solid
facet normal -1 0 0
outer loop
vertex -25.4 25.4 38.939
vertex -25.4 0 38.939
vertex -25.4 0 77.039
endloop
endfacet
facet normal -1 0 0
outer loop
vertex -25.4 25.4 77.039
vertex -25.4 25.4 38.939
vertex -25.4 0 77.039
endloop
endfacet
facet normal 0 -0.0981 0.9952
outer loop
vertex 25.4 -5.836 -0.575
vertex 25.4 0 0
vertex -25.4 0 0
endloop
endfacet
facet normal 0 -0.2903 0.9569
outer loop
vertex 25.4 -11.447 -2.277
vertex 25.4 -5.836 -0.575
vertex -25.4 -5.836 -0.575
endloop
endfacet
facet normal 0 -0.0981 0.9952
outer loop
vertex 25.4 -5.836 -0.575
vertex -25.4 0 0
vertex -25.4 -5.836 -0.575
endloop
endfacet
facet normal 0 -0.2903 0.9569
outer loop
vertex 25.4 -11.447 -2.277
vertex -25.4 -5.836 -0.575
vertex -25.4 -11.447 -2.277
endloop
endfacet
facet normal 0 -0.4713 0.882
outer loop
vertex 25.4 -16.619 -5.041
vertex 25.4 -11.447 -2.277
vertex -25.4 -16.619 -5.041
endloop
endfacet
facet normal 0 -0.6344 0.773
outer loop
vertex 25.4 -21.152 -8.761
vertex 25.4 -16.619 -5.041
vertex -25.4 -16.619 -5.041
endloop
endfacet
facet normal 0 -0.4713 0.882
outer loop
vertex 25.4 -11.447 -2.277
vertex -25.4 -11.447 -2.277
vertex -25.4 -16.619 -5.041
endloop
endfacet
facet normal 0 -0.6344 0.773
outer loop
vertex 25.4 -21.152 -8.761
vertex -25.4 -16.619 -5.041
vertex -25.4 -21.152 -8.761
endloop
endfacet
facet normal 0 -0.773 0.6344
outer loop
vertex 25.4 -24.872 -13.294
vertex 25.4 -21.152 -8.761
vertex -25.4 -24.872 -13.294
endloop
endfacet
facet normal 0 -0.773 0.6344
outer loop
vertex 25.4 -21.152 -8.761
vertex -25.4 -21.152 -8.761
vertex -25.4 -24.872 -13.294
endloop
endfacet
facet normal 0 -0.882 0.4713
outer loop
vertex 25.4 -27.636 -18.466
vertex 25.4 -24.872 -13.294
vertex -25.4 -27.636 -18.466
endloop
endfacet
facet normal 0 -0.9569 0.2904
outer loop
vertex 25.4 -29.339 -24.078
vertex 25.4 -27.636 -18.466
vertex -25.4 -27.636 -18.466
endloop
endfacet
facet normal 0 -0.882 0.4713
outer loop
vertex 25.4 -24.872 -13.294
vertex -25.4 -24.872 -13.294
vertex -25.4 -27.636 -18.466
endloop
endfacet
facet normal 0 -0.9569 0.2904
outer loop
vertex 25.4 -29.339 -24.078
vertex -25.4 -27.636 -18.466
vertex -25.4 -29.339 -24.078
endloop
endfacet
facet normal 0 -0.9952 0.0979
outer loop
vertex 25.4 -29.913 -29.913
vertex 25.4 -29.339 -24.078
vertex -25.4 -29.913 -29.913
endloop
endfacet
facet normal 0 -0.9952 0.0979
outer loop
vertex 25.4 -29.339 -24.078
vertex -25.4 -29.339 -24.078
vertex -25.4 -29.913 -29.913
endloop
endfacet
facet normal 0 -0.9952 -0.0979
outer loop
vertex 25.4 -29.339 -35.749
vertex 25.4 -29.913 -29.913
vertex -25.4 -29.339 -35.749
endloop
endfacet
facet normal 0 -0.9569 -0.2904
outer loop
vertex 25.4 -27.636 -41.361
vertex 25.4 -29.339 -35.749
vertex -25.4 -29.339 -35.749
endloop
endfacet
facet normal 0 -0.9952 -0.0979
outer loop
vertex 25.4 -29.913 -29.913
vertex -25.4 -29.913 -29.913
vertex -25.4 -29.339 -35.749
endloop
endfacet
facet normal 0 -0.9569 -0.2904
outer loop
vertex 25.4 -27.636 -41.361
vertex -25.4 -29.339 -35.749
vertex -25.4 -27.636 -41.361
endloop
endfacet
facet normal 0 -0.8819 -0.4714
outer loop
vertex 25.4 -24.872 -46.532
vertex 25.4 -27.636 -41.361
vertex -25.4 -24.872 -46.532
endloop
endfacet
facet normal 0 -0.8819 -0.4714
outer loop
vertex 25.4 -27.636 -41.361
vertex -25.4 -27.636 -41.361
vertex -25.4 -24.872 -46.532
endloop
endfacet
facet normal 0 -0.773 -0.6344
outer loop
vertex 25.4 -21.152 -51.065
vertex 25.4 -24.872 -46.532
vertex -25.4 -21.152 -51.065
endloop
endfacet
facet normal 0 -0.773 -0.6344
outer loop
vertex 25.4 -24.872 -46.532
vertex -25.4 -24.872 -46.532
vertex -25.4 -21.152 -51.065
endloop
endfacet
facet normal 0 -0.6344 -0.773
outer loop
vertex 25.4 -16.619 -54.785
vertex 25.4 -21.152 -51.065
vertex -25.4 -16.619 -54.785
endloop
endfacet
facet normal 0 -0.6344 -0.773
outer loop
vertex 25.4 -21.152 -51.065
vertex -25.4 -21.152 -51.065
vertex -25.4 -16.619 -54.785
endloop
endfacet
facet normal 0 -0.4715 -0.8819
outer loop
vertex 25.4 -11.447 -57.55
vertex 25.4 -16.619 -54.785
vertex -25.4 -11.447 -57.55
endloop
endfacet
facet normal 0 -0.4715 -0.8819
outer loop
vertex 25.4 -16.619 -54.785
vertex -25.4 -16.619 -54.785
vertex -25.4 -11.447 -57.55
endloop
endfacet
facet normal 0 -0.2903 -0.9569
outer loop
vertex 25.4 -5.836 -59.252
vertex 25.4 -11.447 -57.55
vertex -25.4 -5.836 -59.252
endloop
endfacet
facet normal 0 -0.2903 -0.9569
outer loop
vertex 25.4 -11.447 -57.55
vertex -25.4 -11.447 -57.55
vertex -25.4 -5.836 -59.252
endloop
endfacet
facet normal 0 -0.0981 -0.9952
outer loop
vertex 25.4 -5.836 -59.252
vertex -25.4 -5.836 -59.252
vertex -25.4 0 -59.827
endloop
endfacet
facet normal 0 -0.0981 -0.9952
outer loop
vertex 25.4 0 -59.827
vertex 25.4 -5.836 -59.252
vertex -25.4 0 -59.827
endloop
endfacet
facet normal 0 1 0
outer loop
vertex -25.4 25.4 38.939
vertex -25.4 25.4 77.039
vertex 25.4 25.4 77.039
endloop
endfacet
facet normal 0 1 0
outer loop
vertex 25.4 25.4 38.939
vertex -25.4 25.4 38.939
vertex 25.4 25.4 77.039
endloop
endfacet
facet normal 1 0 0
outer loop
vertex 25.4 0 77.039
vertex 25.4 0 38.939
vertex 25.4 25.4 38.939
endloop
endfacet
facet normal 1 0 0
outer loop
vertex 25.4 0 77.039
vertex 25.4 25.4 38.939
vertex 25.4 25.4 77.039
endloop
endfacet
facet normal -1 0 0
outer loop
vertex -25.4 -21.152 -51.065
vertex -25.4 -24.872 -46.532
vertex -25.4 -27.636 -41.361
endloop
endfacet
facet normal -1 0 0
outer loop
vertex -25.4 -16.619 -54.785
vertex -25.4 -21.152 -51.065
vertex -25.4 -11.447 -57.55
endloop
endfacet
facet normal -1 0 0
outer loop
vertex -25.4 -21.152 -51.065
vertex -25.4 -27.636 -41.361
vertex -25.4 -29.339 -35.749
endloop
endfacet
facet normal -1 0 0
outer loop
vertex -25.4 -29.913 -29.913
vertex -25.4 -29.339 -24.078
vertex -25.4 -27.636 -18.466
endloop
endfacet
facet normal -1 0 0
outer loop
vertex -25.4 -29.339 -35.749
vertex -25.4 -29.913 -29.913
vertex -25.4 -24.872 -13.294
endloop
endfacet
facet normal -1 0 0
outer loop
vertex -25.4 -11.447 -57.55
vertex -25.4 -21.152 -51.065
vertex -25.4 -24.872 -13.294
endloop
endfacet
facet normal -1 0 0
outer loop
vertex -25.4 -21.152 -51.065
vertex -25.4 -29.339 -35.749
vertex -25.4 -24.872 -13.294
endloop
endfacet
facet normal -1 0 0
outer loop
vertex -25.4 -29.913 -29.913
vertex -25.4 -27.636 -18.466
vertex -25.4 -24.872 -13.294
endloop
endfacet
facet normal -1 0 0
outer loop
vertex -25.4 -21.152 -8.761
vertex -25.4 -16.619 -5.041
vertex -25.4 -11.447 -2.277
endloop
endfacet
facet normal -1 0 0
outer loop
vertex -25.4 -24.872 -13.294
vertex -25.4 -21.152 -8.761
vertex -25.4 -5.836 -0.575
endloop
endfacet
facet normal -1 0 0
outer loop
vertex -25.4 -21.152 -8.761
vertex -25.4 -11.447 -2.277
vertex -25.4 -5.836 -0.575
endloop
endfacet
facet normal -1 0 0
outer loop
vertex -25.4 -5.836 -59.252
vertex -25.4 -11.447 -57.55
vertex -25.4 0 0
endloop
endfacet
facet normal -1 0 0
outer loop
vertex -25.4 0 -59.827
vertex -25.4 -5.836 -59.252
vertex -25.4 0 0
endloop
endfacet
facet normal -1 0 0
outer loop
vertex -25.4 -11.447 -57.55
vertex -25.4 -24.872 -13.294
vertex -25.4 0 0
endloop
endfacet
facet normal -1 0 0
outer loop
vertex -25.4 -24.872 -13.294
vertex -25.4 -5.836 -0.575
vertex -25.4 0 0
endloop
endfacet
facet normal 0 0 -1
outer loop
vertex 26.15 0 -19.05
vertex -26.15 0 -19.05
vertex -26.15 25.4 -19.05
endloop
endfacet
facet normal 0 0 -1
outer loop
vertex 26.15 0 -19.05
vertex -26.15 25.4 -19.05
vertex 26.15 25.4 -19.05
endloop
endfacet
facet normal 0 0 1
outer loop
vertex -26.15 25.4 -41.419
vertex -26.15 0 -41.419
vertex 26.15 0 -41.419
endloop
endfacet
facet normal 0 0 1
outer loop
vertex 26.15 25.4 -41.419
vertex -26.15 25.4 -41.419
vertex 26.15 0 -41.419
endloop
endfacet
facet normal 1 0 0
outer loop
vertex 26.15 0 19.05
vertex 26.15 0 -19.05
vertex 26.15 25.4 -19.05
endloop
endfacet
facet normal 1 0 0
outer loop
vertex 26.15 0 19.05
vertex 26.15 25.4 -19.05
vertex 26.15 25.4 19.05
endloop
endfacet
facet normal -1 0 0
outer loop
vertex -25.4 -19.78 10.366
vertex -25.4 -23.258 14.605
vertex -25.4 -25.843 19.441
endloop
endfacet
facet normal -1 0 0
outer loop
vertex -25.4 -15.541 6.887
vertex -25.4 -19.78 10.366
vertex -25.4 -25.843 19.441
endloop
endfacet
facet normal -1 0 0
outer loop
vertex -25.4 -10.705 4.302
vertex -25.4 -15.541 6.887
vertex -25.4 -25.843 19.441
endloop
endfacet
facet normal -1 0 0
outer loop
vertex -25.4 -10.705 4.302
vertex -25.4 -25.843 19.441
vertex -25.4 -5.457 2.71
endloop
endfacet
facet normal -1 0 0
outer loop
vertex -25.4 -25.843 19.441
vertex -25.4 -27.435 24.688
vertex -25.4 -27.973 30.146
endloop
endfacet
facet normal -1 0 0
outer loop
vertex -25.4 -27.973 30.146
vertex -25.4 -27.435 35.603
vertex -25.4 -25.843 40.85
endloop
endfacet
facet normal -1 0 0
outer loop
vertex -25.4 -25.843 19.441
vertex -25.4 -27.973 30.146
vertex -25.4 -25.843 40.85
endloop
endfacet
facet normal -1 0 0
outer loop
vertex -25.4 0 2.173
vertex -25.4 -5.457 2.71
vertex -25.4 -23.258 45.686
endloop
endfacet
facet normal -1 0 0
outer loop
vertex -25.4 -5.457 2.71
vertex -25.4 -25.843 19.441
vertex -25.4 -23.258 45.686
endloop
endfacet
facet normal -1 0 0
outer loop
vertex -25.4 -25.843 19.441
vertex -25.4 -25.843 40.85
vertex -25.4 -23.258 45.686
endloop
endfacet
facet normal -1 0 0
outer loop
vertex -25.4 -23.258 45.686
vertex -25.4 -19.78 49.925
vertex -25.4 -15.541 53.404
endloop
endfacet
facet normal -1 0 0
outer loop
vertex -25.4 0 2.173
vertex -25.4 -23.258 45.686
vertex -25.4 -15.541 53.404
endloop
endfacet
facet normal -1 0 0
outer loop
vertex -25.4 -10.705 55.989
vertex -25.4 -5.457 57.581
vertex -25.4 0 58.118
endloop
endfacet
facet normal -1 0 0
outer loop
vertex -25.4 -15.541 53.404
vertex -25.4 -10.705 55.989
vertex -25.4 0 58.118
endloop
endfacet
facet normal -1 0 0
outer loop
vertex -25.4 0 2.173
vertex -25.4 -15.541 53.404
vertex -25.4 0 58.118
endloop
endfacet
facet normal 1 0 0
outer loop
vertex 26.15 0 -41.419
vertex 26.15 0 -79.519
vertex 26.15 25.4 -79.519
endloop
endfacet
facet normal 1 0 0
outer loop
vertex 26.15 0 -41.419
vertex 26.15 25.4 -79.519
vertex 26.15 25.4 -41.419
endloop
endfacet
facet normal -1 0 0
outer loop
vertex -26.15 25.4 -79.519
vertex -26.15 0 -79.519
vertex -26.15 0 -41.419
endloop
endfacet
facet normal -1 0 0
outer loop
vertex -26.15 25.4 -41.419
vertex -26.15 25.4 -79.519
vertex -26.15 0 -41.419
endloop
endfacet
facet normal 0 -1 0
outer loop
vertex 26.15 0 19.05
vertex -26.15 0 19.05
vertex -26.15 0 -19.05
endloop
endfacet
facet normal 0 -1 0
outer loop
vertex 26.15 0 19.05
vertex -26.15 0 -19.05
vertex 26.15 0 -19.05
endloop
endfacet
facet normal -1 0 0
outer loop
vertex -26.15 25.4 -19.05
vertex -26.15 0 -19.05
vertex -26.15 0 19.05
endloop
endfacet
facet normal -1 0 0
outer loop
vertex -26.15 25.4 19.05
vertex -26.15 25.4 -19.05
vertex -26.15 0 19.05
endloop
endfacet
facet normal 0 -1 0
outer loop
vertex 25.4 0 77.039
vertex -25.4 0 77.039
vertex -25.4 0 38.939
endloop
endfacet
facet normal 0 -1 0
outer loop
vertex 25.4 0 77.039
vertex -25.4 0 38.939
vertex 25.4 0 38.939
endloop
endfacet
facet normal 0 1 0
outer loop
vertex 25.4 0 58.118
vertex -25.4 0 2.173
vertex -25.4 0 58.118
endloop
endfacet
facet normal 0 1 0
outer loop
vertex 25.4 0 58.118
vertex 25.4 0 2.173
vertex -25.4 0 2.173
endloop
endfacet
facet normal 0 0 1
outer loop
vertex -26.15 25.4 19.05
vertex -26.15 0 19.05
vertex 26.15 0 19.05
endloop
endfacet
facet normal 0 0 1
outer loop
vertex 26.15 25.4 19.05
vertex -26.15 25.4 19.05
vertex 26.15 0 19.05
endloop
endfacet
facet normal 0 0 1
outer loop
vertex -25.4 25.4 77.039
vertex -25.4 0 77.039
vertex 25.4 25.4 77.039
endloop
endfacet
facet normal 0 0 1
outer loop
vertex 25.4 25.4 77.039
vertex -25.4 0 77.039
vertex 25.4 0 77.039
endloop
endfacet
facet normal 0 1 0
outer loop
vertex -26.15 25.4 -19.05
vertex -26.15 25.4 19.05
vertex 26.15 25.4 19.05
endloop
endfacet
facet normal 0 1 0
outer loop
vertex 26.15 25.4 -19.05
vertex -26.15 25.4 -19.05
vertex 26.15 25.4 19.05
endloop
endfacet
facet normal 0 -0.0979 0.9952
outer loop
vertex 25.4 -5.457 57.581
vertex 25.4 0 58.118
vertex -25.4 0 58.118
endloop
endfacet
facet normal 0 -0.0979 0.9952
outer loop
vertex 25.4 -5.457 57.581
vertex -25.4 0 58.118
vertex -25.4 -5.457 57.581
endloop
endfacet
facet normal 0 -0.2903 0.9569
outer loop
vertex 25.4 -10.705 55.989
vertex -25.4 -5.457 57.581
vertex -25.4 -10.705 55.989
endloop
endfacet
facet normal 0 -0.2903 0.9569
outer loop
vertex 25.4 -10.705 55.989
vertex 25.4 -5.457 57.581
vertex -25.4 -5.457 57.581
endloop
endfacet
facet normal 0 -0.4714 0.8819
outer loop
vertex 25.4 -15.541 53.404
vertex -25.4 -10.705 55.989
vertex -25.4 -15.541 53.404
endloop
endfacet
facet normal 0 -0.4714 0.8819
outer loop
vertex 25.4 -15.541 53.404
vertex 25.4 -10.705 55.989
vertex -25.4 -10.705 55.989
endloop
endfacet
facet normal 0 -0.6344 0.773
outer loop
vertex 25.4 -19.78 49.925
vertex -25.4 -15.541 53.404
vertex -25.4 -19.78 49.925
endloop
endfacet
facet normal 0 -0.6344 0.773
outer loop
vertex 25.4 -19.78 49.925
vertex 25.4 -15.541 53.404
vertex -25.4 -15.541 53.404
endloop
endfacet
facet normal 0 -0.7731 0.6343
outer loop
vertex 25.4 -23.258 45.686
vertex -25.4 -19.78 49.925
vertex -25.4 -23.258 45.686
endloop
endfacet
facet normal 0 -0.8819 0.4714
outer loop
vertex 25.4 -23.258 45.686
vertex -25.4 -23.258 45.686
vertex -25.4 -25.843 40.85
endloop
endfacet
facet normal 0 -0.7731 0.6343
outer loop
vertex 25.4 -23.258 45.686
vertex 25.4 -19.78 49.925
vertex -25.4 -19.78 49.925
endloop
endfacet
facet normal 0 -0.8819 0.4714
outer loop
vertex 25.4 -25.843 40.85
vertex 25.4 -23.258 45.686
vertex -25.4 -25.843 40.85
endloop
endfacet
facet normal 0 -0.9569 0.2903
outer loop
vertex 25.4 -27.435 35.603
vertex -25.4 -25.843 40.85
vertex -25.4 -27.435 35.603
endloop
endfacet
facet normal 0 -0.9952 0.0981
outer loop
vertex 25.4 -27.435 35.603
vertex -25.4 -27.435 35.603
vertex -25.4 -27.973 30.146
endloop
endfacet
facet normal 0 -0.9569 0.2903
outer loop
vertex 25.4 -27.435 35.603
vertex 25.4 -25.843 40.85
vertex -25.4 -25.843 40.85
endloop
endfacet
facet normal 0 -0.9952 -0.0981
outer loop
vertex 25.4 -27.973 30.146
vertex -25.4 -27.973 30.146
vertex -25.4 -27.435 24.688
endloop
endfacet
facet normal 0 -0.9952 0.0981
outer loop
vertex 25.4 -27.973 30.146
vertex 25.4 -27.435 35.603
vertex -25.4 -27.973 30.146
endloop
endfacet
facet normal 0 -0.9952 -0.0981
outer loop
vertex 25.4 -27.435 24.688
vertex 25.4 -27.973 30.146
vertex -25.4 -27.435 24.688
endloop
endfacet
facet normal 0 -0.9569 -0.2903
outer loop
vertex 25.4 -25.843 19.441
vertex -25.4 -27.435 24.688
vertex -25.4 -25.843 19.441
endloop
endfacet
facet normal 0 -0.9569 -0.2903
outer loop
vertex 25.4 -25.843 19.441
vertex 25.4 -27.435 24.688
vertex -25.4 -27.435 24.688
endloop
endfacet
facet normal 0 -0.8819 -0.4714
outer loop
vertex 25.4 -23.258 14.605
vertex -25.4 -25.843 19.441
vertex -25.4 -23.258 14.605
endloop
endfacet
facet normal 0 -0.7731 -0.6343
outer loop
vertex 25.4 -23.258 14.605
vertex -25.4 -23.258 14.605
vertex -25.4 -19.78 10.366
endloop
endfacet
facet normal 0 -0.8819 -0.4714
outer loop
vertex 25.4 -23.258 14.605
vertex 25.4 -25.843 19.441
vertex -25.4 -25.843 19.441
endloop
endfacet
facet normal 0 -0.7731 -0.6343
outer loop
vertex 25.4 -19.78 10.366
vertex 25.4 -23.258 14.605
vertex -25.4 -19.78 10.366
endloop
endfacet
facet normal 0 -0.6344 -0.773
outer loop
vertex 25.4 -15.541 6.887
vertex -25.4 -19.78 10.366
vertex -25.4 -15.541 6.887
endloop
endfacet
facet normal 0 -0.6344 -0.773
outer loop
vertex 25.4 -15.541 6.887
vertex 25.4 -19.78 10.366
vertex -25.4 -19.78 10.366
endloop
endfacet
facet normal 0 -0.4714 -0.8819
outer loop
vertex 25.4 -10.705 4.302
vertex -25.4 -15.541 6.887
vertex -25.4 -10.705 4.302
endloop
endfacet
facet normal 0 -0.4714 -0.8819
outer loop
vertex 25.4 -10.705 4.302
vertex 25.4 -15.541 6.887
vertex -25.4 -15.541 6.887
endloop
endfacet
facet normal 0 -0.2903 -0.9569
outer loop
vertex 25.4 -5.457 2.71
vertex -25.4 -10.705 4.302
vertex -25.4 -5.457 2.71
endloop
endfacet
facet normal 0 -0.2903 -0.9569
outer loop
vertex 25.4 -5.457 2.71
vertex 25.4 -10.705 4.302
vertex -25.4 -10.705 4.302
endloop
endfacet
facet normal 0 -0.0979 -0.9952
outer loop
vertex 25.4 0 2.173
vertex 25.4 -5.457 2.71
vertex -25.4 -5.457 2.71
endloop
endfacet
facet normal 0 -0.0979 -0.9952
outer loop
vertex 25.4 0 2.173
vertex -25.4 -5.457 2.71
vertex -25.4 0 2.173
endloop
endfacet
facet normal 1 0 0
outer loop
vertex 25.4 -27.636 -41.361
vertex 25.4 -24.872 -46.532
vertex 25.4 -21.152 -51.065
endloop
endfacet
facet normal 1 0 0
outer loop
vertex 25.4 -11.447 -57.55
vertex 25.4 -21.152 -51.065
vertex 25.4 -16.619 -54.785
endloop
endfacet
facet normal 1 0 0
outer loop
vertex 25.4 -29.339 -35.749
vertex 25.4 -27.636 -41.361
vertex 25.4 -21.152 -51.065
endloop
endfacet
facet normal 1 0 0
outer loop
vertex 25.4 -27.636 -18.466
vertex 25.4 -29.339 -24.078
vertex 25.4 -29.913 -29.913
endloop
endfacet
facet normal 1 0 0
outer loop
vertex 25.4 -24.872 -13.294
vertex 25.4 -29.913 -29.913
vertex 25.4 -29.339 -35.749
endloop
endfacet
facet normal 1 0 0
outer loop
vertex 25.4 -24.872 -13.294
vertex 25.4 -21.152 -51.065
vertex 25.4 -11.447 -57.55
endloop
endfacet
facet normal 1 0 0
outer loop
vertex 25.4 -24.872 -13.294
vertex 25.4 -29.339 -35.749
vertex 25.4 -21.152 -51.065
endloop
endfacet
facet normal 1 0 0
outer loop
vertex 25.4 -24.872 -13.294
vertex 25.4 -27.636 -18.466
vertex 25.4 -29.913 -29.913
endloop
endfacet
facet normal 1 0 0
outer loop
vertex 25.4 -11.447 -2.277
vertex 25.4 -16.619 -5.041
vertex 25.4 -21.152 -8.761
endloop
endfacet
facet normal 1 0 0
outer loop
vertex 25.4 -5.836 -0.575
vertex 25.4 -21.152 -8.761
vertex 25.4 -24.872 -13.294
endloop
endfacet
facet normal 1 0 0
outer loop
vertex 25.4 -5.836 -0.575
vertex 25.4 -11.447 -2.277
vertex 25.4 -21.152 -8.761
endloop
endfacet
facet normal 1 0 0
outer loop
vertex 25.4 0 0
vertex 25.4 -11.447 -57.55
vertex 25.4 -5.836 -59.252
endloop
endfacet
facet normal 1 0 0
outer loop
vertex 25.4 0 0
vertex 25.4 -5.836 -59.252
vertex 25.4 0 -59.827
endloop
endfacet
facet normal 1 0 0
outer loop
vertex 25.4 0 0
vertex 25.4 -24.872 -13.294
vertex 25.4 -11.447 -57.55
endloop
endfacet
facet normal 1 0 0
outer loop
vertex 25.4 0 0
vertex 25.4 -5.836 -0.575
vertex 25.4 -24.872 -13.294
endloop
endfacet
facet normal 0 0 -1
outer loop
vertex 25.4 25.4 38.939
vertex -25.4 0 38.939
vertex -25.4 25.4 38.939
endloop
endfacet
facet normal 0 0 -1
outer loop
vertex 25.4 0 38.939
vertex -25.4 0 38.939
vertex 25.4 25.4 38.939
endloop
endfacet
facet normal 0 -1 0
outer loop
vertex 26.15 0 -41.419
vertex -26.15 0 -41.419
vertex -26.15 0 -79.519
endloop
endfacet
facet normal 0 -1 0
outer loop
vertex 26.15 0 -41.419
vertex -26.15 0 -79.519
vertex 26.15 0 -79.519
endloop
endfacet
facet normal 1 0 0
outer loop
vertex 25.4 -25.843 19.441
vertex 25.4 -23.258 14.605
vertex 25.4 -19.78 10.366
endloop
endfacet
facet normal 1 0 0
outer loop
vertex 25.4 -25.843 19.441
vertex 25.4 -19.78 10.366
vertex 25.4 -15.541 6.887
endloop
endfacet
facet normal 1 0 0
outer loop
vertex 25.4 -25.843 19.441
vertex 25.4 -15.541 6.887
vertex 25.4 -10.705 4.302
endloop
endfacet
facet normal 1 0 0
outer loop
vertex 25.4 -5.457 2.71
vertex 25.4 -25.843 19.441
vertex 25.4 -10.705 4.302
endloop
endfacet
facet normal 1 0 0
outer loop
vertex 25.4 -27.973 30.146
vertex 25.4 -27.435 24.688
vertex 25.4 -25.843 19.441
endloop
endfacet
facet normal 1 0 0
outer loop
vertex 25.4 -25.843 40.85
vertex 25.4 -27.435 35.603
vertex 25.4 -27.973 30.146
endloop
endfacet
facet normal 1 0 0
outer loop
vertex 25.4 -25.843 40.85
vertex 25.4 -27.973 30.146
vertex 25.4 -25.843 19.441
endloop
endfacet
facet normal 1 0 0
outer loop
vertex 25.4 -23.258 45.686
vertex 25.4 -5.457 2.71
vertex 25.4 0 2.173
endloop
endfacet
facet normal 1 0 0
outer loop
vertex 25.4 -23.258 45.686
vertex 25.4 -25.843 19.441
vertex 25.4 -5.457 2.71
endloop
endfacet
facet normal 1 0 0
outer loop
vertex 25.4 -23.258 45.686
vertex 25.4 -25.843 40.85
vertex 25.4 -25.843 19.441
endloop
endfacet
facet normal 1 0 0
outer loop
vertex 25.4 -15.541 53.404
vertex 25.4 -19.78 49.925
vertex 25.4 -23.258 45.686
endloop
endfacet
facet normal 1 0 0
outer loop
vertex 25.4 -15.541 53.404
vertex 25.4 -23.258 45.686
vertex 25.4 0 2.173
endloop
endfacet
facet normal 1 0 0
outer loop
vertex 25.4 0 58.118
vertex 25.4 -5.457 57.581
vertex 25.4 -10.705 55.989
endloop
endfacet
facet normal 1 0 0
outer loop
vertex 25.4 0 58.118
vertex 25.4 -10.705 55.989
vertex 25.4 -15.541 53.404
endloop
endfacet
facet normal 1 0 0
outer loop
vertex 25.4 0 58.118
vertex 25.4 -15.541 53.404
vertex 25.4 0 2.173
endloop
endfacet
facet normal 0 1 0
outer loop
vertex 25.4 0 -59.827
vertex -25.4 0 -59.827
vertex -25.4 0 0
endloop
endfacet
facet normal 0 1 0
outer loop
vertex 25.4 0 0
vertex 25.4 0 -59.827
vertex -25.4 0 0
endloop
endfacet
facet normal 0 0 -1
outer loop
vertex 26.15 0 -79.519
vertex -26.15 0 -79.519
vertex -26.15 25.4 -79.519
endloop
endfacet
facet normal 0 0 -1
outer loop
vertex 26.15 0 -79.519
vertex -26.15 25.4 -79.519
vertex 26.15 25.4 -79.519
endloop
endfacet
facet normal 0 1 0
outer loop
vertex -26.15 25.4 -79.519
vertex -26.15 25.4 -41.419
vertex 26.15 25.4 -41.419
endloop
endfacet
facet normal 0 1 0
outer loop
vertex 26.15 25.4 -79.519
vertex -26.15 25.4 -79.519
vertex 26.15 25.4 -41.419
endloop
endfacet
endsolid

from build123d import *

# Parameters (mm, degrees)
F0_W     = 50.8
F0_H     = 38.1
F0_W_2   = 52.300984
F2_DEPTH = 25.4
F3_DEPTH = 25.4


with BuildPart() as f2:
    # F0 (on Front) → F2 (new body)
    with BuildSketch(Plane.XZ):
        with Locations((0, 57.988684)):
            Rectangle(F0_W, F0_H)
        Rectangle(F0_W_2, F0_H)
        with Locations((0, -60.469225)):
            Rectangle(F0_W_2, F0_H)
    extrude(amount=-F2_DEPTH)


with BuildPart() as f3:
    # F1 (on Right) → F3 (new body, symmetric)
    with BuildSketch(Plane.YZ):
        with BuildLine():
            Line((0, -59.826694), (0, 0))
            ThreePointArc((0, 0), (-29.913347, -29.913347), (0, -59.826694))
        make_face()
        with BuildLine():
            Line((0, 2.172925), (0, 58.118217))
            ThreePointArc((0, 58.118217), (-27.972646, 30.145571), (0, 2.172925))
        make_face()
    extrude(amount=F3_DEPTH, both=True)


solid = Compound([f2.part, f3.part])
